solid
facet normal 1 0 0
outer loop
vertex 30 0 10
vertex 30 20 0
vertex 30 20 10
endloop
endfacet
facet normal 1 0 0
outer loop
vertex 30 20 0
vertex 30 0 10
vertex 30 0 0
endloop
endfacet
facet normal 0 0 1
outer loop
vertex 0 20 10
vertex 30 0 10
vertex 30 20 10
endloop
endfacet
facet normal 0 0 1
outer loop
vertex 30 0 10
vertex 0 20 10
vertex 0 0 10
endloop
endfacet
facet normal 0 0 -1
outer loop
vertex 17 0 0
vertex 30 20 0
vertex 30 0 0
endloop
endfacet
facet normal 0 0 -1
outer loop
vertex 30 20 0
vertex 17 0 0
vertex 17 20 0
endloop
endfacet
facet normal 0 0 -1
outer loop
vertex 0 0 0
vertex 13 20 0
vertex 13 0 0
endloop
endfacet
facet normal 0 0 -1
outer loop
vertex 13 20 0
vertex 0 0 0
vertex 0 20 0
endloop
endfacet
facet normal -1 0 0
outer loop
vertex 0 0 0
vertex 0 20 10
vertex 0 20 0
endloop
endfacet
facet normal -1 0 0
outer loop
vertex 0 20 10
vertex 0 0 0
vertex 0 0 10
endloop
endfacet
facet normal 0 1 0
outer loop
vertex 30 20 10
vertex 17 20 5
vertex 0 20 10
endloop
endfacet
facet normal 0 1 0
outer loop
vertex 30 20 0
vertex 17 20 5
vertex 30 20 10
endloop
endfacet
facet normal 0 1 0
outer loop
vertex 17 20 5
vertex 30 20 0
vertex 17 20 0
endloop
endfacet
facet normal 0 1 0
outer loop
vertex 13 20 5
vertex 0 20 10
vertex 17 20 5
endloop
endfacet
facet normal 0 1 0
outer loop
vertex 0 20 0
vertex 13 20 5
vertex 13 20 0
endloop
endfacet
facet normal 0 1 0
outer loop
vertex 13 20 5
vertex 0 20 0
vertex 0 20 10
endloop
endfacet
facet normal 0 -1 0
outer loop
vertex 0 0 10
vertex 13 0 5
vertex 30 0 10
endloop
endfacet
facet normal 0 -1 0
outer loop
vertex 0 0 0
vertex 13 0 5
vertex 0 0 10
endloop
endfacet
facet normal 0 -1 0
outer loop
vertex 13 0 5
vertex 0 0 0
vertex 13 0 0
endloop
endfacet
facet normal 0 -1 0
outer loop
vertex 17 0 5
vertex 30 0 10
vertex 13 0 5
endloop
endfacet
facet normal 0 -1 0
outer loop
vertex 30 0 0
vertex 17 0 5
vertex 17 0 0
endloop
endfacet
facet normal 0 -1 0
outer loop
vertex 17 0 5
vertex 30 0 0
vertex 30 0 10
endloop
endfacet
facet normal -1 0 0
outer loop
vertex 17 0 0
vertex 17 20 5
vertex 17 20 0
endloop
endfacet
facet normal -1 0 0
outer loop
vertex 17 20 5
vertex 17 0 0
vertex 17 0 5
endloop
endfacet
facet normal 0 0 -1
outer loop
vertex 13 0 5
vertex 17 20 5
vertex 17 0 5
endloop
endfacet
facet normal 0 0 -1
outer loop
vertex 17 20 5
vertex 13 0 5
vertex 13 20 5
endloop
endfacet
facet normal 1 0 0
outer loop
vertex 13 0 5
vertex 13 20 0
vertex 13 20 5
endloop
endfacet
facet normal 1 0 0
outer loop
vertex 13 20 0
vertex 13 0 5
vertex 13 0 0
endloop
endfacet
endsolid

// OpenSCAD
// Same tunnel 4 mm wide: bridge span 4 mm <= 5 mm prints without support.
difference() { cube([30, 20, 10]); translate([13, -1, -1]) cube([4, 22, 6]); }
